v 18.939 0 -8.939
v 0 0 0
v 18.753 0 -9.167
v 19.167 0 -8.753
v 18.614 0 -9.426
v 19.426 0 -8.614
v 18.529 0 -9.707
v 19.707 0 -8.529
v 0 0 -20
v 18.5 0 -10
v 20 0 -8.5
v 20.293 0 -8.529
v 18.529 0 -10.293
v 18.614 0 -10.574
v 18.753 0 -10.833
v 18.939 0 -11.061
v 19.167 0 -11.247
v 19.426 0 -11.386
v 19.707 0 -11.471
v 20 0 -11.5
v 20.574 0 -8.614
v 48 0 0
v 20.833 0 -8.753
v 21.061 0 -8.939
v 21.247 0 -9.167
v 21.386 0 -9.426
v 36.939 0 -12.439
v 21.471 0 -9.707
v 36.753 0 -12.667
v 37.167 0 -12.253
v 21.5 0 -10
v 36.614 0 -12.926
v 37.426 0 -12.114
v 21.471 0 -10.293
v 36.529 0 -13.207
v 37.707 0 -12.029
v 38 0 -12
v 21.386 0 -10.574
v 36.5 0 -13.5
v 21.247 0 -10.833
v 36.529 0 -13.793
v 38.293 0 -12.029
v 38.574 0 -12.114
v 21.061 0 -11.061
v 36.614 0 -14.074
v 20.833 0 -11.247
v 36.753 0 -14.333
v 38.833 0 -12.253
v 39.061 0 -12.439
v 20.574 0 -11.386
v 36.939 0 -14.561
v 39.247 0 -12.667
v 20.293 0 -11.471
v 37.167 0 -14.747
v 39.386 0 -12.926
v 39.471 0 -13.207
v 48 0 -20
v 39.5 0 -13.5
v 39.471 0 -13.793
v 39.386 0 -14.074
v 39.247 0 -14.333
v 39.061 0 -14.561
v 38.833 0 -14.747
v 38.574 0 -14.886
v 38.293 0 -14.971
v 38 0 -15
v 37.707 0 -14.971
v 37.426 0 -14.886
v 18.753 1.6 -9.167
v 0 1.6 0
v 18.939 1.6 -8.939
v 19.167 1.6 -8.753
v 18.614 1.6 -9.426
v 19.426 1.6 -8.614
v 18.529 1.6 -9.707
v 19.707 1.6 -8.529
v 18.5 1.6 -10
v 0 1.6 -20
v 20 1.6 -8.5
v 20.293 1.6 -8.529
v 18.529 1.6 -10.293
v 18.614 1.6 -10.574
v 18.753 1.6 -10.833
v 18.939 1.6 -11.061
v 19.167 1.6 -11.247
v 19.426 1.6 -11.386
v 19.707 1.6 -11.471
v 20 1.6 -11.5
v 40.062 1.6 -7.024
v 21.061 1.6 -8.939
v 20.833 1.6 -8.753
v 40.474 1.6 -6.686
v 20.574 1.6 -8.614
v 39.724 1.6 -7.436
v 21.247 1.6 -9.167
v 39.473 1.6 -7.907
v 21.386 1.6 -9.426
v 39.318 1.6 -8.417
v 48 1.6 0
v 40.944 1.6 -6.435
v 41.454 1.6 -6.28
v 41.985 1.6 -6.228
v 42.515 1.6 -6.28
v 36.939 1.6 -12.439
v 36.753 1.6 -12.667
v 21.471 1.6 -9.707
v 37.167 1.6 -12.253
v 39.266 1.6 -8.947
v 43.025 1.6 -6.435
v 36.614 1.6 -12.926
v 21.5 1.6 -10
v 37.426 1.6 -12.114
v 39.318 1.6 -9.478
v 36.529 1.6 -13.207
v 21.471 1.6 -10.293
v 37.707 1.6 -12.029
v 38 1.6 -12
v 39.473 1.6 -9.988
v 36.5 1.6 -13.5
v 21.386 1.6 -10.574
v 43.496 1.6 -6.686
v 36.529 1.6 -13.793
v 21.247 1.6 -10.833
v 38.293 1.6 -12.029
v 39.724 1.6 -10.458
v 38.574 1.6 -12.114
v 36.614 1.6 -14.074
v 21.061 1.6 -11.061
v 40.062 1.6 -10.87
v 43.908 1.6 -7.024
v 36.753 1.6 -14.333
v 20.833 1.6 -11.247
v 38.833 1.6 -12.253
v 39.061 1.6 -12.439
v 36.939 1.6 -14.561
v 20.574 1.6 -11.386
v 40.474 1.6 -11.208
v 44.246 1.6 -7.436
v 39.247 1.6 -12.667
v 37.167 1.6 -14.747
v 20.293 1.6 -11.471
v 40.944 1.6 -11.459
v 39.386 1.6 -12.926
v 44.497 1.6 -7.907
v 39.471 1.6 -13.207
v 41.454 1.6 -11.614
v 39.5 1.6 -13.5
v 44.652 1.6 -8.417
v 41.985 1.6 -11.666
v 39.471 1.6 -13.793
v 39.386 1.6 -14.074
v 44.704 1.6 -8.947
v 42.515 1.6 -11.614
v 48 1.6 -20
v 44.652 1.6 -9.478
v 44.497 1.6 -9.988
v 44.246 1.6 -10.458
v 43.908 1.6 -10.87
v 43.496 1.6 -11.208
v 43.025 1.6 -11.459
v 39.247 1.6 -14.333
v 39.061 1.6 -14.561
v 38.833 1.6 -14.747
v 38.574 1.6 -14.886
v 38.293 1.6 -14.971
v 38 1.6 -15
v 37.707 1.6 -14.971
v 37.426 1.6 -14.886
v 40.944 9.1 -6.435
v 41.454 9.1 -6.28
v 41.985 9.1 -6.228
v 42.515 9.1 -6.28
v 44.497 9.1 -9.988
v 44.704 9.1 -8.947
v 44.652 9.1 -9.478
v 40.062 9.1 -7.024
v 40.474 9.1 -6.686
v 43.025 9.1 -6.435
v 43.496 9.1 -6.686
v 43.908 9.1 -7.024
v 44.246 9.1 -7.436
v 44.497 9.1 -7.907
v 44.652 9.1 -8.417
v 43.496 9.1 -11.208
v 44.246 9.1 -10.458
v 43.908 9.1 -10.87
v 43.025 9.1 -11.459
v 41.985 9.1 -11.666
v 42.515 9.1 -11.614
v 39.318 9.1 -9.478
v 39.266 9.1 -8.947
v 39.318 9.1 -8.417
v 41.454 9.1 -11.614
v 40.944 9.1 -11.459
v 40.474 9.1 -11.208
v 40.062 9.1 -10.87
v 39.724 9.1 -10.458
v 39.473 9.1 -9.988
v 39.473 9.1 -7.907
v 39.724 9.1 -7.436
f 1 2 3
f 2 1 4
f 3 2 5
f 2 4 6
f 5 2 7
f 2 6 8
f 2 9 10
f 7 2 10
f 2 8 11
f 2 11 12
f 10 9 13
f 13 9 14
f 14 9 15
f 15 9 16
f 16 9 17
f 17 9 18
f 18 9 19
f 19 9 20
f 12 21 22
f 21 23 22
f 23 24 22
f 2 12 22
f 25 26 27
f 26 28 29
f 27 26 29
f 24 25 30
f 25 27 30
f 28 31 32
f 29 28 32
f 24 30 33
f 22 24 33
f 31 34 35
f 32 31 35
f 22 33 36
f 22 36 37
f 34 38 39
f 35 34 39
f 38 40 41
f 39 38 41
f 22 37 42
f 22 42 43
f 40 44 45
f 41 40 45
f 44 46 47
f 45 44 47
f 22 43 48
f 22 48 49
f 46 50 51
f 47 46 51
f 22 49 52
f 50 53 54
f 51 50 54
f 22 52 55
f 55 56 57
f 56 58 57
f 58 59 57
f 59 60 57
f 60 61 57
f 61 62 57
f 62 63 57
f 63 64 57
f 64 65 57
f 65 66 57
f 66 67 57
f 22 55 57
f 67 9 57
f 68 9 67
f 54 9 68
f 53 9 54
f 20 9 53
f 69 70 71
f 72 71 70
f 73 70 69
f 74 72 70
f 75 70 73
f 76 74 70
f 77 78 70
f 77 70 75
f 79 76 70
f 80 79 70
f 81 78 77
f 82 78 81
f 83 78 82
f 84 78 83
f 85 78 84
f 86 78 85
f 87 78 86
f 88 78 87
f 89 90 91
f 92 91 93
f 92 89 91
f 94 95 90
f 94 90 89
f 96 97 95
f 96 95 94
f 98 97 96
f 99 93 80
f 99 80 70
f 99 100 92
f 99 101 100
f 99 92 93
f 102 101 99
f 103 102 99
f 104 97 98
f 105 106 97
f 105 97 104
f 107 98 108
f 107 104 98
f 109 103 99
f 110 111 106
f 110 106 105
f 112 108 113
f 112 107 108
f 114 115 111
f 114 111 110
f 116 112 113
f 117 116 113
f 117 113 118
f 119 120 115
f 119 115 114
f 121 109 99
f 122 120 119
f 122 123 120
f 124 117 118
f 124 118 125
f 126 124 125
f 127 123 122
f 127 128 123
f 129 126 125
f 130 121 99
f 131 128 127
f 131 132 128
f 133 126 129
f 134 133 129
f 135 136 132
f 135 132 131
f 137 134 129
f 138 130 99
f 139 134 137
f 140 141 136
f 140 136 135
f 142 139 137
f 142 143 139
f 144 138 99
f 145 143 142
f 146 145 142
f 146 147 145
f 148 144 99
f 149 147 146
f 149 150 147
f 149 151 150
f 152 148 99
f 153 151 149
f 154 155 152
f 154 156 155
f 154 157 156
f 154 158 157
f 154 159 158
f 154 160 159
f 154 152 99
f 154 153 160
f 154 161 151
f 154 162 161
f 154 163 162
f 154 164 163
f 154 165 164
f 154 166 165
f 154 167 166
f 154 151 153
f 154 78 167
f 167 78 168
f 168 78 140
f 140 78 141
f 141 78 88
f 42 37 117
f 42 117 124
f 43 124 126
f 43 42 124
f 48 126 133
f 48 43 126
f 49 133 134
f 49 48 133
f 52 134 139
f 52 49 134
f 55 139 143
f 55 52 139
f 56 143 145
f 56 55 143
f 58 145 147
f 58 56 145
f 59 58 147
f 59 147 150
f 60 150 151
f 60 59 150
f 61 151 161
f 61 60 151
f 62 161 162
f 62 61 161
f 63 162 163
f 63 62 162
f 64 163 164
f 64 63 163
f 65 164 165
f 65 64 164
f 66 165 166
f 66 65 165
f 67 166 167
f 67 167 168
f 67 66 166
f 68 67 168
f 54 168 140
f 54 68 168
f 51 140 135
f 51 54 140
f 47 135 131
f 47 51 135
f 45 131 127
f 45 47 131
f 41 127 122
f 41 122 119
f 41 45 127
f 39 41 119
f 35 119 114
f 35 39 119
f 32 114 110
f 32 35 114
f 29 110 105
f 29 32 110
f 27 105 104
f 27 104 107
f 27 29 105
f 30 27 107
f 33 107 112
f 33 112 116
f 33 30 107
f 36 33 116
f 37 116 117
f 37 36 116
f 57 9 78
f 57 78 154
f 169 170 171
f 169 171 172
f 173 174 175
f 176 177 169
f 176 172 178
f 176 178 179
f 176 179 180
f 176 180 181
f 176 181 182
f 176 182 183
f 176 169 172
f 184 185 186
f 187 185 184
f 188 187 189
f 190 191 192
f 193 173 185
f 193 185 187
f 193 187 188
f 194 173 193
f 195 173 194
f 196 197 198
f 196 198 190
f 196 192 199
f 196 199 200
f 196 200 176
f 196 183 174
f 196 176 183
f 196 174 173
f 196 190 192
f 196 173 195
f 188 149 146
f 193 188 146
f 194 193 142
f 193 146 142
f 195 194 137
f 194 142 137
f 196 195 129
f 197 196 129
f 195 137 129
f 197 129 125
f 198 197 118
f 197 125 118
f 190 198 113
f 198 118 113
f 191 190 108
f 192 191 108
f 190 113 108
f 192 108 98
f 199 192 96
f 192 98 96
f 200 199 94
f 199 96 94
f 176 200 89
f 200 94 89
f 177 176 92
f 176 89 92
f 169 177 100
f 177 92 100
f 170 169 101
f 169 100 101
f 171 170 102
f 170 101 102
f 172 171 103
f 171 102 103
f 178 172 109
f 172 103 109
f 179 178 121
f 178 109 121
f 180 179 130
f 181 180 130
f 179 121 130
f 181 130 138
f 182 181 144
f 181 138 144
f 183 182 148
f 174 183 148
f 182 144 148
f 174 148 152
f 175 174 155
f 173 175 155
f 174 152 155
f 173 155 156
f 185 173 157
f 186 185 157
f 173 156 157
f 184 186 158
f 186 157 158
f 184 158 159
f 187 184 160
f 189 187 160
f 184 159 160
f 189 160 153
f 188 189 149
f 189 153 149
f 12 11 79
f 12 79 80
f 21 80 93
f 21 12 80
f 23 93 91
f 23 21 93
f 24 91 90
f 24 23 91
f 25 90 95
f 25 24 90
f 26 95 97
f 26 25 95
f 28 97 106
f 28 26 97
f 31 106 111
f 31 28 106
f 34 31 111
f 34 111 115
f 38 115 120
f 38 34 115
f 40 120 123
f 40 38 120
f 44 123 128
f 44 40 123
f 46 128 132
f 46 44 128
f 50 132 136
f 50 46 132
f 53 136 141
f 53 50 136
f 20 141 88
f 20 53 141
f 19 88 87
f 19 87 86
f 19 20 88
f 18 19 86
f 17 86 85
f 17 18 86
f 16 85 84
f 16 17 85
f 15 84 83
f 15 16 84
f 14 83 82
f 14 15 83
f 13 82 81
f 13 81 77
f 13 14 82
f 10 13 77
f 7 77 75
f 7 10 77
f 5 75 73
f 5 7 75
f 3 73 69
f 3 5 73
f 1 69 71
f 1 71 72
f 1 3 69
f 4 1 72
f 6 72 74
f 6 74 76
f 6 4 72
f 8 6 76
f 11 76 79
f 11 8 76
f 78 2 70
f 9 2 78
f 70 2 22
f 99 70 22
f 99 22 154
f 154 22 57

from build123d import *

# Parameters (mm, degrees)
SKETCH1_W           = 48
SKETCH1_H           = 20
SKETCH1_R           = 1.5
BOSS_EXTRUDE1_DEPTH = 1.6
SKETCH2_R           = 2.719189152
BOSS_EXTRUDE2_DEPTH = 7.5


with BuildPart() as part:
    # Sketch1 → Boss-Extrude1 (new body)
    with BuildSketch(Plane(origin=(0, 0, 0), x_dir=(1, 0, 0), z_dir=(0, 1, 0))):
        with Locations((24, 10)):
            Rectangle(SKETCH1_W, SKETCH1_H)
        with Locations(Location((20, 10, 0), (0, 0, 270))):
            Circle(SKETCH1_R, mode=Mode.SUBTRACT)
        with Locations(Location((38, 13.5, 0), (0, 0, 270))):
            Circle(SKETCH1_R, mode=Mode.SUBTRACT)
    extrude(amount=BOSS_EXTRUDE1_DEPTH)

    # Sketch2 → Boss-Extrude2 (add)
    with BuildSketch(Plane(origin=(0, 1.6, 0), x_dir=(1, 0, 0), z_dir=(0, 1, 0))):
        with Locations(Location((41.98482637, 8.947145481, 0), (0, 0, 90))):
            Circle(SKETCH2_R)
    extrude(amount=BOSS_EXTRUDE2_DEPTH)


solid = part.part
